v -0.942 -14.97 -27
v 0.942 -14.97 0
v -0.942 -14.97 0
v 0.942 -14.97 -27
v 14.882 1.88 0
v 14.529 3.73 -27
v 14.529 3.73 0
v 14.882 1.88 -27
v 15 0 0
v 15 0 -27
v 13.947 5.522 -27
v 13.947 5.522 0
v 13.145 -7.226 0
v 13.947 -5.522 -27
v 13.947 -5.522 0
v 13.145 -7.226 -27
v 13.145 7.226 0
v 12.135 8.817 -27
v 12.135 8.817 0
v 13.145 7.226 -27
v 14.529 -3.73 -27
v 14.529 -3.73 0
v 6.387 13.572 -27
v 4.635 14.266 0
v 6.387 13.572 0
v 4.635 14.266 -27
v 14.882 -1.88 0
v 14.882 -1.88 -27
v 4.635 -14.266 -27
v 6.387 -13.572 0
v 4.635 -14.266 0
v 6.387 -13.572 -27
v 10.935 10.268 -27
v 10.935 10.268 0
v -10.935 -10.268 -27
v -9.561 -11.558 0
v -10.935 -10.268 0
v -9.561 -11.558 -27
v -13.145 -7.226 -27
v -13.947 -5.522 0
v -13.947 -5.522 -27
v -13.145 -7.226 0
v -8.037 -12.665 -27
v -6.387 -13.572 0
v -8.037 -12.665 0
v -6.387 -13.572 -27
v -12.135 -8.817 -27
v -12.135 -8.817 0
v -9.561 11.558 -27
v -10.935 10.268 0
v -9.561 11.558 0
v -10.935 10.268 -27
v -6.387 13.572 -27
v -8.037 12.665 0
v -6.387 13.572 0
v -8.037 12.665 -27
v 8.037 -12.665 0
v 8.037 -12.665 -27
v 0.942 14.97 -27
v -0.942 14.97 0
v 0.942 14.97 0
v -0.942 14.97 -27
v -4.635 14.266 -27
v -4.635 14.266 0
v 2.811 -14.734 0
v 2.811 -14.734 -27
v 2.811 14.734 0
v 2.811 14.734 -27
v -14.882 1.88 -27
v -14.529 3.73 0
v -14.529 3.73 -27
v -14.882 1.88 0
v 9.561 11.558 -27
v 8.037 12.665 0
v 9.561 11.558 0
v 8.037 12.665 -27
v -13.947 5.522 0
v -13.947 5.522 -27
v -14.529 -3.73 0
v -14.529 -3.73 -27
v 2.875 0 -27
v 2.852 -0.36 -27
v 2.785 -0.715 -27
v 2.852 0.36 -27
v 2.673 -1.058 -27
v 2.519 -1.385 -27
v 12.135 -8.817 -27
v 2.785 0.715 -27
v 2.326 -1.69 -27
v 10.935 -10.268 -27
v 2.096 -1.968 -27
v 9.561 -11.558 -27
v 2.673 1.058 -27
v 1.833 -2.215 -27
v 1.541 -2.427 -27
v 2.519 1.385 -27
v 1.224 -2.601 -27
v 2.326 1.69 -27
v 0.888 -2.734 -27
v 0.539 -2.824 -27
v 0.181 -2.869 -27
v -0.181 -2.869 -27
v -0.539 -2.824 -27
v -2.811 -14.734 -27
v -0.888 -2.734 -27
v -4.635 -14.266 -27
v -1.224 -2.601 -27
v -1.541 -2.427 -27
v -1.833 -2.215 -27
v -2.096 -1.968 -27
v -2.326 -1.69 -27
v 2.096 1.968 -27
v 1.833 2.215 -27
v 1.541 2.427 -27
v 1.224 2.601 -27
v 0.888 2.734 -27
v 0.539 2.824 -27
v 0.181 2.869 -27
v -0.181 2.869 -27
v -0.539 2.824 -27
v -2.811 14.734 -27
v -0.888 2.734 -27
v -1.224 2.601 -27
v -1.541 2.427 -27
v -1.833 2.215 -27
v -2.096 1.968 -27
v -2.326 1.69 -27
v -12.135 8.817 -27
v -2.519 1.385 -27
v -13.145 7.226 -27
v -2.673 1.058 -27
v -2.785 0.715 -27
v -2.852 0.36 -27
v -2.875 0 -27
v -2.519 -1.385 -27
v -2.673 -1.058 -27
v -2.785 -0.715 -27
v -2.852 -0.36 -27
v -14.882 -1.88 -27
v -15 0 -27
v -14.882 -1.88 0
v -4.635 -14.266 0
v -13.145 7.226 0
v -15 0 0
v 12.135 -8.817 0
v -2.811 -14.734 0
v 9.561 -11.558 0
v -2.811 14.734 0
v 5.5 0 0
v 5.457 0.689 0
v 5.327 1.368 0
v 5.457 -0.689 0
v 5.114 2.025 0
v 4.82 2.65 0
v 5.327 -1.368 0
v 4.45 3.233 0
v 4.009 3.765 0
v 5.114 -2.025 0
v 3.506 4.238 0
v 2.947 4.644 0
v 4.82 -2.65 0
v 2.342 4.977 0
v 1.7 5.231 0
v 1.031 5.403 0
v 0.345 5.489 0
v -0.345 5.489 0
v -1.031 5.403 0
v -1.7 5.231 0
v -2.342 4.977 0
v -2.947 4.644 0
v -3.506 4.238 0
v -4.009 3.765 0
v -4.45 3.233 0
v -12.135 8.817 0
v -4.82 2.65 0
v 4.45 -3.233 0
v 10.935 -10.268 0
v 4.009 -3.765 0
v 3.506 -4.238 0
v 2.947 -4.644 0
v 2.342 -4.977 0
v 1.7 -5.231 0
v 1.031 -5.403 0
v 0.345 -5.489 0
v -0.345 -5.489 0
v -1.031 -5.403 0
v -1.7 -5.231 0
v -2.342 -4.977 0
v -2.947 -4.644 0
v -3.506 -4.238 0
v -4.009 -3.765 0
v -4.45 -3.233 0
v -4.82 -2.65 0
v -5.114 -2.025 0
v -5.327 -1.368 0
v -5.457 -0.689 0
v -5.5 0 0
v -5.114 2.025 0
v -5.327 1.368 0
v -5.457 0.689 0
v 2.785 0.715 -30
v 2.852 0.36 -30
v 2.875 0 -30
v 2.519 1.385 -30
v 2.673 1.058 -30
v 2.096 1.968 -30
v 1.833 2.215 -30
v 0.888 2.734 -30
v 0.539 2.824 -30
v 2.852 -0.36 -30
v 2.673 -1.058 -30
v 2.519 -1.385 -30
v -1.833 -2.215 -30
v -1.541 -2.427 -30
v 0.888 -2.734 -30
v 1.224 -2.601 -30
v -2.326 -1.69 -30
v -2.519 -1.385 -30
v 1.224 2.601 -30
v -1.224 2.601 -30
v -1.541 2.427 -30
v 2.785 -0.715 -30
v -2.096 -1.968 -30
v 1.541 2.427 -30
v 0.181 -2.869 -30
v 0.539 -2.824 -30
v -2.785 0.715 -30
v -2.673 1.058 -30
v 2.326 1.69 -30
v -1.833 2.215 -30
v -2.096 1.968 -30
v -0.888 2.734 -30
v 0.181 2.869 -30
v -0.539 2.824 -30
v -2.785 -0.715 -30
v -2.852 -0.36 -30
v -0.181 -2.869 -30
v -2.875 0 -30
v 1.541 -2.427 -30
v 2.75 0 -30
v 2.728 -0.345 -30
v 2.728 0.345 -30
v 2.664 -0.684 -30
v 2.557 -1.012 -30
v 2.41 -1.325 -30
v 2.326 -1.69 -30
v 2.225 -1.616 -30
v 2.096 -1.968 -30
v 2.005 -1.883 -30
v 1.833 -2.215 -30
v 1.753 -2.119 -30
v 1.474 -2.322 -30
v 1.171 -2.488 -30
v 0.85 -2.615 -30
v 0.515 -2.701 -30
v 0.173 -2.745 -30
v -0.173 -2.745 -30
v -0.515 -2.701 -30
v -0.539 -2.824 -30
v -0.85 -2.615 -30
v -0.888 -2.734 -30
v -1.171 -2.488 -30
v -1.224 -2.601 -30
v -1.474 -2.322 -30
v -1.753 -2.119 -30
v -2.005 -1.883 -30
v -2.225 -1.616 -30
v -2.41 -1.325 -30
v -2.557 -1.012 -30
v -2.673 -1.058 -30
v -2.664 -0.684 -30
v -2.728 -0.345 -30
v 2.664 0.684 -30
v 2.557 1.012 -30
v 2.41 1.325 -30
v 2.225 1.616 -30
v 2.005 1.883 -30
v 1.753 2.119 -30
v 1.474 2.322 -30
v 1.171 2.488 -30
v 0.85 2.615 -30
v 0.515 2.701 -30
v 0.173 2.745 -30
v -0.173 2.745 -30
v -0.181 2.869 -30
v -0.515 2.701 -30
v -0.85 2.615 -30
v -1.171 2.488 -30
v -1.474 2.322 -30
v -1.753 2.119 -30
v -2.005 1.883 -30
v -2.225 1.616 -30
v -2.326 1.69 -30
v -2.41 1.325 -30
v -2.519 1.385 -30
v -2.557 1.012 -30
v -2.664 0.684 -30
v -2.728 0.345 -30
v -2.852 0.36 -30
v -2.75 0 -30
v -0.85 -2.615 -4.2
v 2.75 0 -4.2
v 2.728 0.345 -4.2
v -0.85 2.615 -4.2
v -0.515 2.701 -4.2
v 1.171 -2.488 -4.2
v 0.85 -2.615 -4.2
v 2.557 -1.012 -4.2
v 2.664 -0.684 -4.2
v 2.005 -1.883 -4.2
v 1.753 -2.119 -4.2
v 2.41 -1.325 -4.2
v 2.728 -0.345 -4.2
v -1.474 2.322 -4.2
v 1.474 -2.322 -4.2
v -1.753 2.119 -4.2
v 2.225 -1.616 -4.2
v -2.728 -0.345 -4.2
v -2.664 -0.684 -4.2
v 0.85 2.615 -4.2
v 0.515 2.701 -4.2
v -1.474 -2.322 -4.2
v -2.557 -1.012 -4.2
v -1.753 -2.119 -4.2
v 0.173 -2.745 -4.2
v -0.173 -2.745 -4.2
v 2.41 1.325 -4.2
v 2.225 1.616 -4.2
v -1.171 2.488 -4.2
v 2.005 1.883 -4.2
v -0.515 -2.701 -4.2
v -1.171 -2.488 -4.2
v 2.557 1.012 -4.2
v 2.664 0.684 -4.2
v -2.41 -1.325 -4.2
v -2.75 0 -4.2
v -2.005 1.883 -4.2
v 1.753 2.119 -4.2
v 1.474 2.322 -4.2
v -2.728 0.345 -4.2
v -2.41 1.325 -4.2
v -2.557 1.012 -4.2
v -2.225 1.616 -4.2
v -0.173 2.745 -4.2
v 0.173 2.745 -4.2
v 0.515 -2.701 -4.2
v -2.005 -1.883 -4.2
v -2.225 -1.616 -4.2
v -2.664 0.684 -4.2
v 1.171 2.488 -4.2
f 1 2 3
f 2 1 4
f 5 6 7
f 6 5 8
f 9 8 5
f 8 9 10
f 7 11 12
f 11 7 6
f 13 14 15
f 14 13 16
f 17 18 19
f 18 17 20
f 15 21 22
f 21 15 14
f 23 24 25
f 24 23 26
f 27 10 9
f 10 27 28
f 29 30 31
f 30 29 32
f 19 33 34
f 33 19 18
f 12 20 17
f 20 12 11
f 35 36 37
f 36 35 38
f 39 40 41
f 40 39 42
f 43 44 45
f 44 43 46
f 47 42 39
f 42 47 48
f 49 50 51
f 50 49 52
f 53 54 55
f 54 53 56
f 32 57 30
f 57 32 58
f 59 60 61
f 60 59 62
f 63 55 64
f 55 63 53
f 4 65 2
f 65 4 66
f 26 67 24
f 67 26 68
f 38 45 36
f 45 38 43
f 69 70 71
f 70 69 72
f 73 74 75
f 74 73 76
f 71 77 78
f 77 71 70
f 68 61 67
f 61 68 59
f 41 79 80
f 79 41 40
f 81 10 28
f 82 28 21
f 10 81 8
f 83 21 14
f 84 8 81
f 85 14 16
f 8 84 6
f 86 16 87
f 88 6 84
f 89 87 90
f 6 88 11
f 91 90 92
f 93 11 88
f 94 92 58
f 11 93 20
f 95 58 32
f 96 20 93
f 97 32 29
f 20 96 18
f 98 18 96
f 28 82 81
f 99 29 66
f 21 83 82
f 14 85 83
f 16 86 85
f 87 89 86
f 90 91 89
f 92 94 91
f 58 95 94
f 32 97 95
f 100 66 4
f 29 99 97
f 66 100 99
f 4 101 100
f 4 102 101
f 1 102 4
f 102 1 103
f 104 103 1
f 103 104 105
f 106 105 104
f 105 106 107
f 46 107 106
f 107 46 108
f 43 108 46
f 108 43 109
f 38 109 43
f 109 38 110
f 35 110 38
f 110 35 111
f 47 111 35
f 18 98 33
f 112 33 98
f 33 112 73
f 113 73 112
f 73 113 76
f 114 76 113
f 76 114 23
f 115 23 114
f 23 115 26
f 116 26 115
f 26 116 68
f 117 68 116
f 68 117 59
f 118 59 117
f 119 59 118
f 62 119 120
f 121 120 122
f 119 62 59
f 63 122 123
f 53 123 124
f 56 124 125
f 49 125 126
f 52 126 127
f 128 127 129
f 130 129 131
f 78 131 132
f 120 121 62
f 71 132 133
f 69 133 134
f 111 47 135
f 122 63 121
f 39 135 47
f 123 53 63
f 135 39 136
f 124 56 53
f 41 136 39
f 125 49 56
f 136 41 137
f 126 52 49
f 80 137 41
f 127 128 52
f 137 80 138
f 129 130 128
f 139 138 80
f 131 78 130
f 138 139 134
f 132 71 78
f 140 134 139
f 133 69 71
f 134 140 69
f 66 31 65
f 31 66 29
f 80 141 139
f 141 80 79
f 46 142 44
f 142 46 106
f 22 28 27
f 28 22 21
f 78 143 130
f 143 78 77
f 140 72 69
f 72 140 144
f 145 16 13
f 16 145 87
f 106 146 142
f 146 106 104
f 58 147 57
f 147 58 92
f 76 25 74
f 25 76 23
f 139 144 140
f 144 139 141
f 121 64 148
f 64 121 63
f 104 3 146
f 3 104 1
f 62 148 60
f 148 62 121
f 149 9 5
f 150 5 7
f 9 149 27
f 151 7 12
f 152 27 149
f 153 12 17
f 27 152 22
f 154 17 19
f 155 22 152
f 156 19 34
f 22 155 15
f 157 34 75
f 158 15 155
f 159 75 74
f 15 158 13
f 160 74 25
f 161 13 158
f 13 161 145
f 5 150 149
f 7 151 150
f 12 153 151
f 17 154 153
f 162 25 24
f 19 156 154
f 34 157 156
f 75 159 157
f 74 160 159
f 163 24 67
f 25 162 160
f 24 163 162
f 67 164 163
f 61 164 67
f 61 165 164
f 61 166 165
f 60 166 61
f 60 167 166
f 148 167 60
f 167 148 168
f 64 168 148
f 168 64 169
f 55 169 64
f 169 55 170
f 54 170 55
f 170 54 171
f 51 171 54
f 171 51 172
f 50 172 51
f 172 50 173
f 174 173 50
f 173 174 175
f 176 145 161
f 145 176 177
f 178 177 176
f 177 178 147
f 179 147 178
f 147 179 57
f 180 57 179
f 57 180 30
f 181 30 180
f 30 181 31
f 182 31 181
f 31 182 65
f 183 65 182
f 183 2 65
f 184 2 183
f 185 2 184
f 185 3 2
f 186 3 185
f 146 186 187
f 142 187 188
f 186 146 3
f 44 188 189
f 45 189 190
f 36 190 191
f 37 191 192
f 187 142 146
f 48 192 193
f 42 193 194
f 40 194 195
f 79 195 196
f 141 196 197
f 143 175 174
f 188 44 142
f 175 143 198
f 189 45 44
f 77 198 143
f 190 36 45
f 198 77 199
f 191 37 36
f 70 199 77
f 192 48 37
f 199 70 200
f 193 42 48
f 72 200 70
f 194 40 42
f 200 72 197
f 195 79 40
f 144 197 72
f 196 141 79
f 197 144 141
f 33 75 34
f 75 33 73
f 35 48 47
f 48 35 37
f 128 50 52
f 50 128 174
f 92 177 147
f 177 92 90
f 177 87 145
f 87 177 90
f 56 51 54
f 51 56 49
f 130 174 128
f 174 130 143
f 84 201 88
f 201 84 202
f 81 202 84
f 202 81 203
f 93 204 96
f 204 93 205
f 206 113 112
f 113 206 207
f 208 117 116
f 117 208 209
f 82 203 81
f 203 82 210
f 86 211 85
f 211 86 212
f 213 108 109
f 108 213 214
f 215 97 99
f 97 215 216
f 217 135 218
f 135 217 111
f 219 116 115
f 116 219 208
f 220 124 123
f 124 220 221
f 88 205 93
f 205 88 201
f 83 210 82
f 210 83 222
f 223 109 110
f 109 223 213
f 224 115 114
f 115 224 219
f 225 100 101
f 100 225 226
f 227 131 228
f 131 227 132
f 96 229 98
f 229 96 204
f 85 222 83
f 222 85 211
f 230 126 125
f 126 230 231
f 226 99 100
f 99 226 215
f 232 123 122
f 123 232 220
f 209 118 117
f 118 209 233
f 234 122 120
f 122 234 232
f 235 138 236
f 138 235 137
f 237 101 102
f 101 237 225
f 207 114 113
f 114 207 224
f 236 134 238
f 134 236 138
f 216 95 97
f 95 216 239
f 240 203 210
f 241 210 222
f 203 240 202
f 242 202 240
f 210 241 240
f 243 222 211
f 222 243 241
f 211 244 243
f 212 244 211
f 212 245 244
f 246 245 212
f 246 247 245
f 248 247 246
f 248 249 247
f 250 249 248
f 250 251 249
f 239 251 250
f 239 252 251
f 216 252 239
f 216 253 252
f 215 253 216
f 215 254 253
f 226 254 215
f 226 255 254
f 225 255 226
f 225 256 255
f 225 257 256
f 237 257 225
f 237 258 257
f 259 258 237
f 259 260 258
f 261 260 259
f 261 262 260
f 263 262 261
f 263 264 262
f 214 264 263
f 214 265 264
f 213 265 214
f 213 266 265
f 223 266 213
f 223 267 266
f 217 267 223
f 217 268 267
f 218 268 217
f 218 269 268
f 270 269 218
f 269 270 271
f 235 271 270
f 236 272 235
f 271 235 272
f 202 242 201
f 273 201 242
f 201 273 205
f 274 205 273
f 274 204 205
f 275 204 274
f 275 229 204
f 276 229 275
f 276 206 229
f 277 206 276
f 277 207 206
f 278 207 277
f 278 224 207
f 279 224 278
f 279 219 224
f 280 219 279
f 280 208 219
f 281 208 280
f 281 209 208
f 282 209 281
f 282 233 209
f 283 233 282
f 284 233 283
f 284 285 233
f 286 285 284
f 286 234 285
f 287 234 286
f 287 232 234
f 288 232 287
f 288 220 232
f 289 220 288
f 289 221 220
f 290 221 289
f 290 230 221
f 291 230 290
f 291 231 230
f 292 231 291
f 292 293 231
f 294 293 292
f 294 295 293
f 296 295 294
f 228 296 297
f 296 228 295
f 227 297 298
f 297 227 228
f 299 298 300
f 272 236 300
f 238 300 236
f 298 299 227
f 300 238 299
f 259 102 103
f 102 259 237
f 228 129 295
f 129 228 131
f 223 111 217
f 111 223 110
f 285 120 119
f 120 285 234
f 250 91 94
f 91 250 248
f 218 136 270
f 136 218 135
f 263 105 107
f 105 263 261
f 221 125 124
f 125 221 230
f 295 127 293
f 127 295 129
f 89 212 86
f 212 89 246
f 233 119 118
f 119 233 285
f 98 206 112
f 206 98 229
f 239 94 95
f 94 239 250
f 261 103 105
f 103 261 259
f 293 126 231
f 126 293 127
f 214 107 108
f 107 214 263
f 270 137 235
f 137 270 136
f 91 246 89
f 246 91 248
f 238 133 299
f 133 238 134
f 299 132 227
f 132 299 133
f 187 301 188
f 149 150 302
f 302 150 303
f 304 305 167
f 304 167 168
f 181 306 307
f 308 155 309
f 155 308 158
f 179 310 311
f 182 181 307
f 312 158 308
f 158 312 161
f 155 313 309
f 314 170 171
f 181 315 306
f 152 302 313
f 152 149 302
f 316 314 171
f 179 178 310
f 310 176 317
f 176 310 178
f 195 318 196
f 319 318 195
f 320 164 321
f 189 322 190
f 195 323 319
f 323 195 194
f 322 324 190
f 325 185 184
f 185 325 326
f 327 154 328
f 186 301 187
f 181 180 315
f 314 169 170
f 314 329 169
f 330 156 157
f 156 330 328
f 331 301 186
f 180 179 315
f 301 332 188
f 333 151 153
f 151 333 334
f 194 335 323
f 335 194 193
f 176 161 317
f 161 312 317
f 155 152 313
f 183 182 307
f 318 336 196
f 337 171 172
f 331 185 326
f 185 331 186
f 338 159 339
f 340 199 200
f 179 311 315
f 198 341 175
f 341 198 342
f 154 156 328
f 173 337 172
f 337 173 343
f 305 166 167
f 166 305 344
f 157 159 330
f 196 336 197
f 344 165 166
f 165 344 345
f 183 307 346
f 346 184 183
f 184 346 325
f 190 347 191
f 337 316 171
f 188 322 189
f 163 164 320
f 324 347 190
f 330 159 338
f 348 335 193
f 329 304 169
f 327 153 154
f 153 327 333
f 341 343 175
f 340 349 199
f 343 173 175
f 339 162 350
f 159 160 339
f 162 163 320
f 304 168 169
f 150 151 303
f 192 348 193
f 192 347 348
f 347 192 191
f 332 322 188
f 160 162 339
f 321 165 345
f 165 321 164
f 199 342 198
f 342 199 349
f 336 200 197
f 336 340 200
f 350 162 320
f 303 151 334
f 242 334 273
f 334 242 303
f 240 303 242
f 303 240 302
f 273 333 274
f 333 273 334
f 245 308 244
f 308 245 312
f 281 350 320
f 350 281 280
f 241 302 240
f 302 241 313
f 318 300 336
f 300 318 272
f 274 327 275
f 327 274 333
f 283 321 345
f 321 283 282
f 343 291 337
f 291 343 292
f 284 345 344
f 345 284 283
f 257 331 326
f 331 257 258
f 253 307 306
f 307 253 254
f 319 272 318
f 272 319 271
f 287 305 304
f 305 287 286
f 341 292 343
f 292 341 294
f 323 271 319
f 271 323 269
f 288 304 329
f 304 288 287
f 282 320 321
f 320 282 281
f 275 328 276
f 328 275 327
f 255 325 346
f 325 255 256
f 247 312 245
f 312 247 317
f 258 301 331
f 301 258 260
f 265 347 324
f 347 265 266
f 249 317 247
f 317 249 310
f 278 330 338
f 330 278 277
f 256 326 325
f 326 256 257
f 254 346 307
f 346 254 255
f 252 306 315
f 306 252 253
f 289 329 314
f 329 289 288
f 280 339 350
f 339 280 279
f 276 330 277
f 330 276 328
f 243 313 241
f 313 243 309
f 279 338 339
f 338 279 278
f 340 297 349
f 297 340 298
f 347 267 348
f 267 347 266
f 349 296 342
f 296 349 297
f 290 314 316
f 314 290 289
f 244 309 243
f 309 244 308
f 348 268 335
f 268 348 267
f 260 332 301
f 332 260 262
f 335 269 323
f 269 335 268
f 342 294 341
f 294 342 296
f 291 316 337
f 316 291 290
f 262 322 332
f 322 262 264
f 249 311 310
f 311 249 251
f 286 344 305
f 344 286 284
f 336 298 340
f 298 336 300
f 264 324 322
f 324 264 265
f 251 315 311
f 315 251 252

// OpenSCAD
$fn = 50;


difference() {
	union() {
		translate(v = [0, 0, -27.0000000000]) {
			cylinder(h = 27, r = 15.0000000000);
		}
		#translate(v = [0, 0, -30.0000000000]) {
			cylinder(h = 30, r = 2.8750000000);
		}
	}
	union() {
		translate(v = [0, 0, 0]) {
			rotate(a = [0, 0, 0]) {
				difference() {
					union() {
						translate(v = [0, 0, -30.0000000000]) {
							cylinder(h = 30, r = 2.2500000000);
						}
						translate(v = [0, 0, -4.2000000000]) {
							cylinder(h = 4.2000000000, r1 = 2.7500000000, r2 = 5.5000000000);
						}
						translate(v = [0, 0, -30.0000000000]) {
							cylinder(h = 30, r = 2.7500000000);
						}
						translate(v = [0, 0, -30.0000000000]) {
							cylinder(h = 30, r = 2.2500000000);
						}
					}
					union();
				}
			}
		}
	}
}
